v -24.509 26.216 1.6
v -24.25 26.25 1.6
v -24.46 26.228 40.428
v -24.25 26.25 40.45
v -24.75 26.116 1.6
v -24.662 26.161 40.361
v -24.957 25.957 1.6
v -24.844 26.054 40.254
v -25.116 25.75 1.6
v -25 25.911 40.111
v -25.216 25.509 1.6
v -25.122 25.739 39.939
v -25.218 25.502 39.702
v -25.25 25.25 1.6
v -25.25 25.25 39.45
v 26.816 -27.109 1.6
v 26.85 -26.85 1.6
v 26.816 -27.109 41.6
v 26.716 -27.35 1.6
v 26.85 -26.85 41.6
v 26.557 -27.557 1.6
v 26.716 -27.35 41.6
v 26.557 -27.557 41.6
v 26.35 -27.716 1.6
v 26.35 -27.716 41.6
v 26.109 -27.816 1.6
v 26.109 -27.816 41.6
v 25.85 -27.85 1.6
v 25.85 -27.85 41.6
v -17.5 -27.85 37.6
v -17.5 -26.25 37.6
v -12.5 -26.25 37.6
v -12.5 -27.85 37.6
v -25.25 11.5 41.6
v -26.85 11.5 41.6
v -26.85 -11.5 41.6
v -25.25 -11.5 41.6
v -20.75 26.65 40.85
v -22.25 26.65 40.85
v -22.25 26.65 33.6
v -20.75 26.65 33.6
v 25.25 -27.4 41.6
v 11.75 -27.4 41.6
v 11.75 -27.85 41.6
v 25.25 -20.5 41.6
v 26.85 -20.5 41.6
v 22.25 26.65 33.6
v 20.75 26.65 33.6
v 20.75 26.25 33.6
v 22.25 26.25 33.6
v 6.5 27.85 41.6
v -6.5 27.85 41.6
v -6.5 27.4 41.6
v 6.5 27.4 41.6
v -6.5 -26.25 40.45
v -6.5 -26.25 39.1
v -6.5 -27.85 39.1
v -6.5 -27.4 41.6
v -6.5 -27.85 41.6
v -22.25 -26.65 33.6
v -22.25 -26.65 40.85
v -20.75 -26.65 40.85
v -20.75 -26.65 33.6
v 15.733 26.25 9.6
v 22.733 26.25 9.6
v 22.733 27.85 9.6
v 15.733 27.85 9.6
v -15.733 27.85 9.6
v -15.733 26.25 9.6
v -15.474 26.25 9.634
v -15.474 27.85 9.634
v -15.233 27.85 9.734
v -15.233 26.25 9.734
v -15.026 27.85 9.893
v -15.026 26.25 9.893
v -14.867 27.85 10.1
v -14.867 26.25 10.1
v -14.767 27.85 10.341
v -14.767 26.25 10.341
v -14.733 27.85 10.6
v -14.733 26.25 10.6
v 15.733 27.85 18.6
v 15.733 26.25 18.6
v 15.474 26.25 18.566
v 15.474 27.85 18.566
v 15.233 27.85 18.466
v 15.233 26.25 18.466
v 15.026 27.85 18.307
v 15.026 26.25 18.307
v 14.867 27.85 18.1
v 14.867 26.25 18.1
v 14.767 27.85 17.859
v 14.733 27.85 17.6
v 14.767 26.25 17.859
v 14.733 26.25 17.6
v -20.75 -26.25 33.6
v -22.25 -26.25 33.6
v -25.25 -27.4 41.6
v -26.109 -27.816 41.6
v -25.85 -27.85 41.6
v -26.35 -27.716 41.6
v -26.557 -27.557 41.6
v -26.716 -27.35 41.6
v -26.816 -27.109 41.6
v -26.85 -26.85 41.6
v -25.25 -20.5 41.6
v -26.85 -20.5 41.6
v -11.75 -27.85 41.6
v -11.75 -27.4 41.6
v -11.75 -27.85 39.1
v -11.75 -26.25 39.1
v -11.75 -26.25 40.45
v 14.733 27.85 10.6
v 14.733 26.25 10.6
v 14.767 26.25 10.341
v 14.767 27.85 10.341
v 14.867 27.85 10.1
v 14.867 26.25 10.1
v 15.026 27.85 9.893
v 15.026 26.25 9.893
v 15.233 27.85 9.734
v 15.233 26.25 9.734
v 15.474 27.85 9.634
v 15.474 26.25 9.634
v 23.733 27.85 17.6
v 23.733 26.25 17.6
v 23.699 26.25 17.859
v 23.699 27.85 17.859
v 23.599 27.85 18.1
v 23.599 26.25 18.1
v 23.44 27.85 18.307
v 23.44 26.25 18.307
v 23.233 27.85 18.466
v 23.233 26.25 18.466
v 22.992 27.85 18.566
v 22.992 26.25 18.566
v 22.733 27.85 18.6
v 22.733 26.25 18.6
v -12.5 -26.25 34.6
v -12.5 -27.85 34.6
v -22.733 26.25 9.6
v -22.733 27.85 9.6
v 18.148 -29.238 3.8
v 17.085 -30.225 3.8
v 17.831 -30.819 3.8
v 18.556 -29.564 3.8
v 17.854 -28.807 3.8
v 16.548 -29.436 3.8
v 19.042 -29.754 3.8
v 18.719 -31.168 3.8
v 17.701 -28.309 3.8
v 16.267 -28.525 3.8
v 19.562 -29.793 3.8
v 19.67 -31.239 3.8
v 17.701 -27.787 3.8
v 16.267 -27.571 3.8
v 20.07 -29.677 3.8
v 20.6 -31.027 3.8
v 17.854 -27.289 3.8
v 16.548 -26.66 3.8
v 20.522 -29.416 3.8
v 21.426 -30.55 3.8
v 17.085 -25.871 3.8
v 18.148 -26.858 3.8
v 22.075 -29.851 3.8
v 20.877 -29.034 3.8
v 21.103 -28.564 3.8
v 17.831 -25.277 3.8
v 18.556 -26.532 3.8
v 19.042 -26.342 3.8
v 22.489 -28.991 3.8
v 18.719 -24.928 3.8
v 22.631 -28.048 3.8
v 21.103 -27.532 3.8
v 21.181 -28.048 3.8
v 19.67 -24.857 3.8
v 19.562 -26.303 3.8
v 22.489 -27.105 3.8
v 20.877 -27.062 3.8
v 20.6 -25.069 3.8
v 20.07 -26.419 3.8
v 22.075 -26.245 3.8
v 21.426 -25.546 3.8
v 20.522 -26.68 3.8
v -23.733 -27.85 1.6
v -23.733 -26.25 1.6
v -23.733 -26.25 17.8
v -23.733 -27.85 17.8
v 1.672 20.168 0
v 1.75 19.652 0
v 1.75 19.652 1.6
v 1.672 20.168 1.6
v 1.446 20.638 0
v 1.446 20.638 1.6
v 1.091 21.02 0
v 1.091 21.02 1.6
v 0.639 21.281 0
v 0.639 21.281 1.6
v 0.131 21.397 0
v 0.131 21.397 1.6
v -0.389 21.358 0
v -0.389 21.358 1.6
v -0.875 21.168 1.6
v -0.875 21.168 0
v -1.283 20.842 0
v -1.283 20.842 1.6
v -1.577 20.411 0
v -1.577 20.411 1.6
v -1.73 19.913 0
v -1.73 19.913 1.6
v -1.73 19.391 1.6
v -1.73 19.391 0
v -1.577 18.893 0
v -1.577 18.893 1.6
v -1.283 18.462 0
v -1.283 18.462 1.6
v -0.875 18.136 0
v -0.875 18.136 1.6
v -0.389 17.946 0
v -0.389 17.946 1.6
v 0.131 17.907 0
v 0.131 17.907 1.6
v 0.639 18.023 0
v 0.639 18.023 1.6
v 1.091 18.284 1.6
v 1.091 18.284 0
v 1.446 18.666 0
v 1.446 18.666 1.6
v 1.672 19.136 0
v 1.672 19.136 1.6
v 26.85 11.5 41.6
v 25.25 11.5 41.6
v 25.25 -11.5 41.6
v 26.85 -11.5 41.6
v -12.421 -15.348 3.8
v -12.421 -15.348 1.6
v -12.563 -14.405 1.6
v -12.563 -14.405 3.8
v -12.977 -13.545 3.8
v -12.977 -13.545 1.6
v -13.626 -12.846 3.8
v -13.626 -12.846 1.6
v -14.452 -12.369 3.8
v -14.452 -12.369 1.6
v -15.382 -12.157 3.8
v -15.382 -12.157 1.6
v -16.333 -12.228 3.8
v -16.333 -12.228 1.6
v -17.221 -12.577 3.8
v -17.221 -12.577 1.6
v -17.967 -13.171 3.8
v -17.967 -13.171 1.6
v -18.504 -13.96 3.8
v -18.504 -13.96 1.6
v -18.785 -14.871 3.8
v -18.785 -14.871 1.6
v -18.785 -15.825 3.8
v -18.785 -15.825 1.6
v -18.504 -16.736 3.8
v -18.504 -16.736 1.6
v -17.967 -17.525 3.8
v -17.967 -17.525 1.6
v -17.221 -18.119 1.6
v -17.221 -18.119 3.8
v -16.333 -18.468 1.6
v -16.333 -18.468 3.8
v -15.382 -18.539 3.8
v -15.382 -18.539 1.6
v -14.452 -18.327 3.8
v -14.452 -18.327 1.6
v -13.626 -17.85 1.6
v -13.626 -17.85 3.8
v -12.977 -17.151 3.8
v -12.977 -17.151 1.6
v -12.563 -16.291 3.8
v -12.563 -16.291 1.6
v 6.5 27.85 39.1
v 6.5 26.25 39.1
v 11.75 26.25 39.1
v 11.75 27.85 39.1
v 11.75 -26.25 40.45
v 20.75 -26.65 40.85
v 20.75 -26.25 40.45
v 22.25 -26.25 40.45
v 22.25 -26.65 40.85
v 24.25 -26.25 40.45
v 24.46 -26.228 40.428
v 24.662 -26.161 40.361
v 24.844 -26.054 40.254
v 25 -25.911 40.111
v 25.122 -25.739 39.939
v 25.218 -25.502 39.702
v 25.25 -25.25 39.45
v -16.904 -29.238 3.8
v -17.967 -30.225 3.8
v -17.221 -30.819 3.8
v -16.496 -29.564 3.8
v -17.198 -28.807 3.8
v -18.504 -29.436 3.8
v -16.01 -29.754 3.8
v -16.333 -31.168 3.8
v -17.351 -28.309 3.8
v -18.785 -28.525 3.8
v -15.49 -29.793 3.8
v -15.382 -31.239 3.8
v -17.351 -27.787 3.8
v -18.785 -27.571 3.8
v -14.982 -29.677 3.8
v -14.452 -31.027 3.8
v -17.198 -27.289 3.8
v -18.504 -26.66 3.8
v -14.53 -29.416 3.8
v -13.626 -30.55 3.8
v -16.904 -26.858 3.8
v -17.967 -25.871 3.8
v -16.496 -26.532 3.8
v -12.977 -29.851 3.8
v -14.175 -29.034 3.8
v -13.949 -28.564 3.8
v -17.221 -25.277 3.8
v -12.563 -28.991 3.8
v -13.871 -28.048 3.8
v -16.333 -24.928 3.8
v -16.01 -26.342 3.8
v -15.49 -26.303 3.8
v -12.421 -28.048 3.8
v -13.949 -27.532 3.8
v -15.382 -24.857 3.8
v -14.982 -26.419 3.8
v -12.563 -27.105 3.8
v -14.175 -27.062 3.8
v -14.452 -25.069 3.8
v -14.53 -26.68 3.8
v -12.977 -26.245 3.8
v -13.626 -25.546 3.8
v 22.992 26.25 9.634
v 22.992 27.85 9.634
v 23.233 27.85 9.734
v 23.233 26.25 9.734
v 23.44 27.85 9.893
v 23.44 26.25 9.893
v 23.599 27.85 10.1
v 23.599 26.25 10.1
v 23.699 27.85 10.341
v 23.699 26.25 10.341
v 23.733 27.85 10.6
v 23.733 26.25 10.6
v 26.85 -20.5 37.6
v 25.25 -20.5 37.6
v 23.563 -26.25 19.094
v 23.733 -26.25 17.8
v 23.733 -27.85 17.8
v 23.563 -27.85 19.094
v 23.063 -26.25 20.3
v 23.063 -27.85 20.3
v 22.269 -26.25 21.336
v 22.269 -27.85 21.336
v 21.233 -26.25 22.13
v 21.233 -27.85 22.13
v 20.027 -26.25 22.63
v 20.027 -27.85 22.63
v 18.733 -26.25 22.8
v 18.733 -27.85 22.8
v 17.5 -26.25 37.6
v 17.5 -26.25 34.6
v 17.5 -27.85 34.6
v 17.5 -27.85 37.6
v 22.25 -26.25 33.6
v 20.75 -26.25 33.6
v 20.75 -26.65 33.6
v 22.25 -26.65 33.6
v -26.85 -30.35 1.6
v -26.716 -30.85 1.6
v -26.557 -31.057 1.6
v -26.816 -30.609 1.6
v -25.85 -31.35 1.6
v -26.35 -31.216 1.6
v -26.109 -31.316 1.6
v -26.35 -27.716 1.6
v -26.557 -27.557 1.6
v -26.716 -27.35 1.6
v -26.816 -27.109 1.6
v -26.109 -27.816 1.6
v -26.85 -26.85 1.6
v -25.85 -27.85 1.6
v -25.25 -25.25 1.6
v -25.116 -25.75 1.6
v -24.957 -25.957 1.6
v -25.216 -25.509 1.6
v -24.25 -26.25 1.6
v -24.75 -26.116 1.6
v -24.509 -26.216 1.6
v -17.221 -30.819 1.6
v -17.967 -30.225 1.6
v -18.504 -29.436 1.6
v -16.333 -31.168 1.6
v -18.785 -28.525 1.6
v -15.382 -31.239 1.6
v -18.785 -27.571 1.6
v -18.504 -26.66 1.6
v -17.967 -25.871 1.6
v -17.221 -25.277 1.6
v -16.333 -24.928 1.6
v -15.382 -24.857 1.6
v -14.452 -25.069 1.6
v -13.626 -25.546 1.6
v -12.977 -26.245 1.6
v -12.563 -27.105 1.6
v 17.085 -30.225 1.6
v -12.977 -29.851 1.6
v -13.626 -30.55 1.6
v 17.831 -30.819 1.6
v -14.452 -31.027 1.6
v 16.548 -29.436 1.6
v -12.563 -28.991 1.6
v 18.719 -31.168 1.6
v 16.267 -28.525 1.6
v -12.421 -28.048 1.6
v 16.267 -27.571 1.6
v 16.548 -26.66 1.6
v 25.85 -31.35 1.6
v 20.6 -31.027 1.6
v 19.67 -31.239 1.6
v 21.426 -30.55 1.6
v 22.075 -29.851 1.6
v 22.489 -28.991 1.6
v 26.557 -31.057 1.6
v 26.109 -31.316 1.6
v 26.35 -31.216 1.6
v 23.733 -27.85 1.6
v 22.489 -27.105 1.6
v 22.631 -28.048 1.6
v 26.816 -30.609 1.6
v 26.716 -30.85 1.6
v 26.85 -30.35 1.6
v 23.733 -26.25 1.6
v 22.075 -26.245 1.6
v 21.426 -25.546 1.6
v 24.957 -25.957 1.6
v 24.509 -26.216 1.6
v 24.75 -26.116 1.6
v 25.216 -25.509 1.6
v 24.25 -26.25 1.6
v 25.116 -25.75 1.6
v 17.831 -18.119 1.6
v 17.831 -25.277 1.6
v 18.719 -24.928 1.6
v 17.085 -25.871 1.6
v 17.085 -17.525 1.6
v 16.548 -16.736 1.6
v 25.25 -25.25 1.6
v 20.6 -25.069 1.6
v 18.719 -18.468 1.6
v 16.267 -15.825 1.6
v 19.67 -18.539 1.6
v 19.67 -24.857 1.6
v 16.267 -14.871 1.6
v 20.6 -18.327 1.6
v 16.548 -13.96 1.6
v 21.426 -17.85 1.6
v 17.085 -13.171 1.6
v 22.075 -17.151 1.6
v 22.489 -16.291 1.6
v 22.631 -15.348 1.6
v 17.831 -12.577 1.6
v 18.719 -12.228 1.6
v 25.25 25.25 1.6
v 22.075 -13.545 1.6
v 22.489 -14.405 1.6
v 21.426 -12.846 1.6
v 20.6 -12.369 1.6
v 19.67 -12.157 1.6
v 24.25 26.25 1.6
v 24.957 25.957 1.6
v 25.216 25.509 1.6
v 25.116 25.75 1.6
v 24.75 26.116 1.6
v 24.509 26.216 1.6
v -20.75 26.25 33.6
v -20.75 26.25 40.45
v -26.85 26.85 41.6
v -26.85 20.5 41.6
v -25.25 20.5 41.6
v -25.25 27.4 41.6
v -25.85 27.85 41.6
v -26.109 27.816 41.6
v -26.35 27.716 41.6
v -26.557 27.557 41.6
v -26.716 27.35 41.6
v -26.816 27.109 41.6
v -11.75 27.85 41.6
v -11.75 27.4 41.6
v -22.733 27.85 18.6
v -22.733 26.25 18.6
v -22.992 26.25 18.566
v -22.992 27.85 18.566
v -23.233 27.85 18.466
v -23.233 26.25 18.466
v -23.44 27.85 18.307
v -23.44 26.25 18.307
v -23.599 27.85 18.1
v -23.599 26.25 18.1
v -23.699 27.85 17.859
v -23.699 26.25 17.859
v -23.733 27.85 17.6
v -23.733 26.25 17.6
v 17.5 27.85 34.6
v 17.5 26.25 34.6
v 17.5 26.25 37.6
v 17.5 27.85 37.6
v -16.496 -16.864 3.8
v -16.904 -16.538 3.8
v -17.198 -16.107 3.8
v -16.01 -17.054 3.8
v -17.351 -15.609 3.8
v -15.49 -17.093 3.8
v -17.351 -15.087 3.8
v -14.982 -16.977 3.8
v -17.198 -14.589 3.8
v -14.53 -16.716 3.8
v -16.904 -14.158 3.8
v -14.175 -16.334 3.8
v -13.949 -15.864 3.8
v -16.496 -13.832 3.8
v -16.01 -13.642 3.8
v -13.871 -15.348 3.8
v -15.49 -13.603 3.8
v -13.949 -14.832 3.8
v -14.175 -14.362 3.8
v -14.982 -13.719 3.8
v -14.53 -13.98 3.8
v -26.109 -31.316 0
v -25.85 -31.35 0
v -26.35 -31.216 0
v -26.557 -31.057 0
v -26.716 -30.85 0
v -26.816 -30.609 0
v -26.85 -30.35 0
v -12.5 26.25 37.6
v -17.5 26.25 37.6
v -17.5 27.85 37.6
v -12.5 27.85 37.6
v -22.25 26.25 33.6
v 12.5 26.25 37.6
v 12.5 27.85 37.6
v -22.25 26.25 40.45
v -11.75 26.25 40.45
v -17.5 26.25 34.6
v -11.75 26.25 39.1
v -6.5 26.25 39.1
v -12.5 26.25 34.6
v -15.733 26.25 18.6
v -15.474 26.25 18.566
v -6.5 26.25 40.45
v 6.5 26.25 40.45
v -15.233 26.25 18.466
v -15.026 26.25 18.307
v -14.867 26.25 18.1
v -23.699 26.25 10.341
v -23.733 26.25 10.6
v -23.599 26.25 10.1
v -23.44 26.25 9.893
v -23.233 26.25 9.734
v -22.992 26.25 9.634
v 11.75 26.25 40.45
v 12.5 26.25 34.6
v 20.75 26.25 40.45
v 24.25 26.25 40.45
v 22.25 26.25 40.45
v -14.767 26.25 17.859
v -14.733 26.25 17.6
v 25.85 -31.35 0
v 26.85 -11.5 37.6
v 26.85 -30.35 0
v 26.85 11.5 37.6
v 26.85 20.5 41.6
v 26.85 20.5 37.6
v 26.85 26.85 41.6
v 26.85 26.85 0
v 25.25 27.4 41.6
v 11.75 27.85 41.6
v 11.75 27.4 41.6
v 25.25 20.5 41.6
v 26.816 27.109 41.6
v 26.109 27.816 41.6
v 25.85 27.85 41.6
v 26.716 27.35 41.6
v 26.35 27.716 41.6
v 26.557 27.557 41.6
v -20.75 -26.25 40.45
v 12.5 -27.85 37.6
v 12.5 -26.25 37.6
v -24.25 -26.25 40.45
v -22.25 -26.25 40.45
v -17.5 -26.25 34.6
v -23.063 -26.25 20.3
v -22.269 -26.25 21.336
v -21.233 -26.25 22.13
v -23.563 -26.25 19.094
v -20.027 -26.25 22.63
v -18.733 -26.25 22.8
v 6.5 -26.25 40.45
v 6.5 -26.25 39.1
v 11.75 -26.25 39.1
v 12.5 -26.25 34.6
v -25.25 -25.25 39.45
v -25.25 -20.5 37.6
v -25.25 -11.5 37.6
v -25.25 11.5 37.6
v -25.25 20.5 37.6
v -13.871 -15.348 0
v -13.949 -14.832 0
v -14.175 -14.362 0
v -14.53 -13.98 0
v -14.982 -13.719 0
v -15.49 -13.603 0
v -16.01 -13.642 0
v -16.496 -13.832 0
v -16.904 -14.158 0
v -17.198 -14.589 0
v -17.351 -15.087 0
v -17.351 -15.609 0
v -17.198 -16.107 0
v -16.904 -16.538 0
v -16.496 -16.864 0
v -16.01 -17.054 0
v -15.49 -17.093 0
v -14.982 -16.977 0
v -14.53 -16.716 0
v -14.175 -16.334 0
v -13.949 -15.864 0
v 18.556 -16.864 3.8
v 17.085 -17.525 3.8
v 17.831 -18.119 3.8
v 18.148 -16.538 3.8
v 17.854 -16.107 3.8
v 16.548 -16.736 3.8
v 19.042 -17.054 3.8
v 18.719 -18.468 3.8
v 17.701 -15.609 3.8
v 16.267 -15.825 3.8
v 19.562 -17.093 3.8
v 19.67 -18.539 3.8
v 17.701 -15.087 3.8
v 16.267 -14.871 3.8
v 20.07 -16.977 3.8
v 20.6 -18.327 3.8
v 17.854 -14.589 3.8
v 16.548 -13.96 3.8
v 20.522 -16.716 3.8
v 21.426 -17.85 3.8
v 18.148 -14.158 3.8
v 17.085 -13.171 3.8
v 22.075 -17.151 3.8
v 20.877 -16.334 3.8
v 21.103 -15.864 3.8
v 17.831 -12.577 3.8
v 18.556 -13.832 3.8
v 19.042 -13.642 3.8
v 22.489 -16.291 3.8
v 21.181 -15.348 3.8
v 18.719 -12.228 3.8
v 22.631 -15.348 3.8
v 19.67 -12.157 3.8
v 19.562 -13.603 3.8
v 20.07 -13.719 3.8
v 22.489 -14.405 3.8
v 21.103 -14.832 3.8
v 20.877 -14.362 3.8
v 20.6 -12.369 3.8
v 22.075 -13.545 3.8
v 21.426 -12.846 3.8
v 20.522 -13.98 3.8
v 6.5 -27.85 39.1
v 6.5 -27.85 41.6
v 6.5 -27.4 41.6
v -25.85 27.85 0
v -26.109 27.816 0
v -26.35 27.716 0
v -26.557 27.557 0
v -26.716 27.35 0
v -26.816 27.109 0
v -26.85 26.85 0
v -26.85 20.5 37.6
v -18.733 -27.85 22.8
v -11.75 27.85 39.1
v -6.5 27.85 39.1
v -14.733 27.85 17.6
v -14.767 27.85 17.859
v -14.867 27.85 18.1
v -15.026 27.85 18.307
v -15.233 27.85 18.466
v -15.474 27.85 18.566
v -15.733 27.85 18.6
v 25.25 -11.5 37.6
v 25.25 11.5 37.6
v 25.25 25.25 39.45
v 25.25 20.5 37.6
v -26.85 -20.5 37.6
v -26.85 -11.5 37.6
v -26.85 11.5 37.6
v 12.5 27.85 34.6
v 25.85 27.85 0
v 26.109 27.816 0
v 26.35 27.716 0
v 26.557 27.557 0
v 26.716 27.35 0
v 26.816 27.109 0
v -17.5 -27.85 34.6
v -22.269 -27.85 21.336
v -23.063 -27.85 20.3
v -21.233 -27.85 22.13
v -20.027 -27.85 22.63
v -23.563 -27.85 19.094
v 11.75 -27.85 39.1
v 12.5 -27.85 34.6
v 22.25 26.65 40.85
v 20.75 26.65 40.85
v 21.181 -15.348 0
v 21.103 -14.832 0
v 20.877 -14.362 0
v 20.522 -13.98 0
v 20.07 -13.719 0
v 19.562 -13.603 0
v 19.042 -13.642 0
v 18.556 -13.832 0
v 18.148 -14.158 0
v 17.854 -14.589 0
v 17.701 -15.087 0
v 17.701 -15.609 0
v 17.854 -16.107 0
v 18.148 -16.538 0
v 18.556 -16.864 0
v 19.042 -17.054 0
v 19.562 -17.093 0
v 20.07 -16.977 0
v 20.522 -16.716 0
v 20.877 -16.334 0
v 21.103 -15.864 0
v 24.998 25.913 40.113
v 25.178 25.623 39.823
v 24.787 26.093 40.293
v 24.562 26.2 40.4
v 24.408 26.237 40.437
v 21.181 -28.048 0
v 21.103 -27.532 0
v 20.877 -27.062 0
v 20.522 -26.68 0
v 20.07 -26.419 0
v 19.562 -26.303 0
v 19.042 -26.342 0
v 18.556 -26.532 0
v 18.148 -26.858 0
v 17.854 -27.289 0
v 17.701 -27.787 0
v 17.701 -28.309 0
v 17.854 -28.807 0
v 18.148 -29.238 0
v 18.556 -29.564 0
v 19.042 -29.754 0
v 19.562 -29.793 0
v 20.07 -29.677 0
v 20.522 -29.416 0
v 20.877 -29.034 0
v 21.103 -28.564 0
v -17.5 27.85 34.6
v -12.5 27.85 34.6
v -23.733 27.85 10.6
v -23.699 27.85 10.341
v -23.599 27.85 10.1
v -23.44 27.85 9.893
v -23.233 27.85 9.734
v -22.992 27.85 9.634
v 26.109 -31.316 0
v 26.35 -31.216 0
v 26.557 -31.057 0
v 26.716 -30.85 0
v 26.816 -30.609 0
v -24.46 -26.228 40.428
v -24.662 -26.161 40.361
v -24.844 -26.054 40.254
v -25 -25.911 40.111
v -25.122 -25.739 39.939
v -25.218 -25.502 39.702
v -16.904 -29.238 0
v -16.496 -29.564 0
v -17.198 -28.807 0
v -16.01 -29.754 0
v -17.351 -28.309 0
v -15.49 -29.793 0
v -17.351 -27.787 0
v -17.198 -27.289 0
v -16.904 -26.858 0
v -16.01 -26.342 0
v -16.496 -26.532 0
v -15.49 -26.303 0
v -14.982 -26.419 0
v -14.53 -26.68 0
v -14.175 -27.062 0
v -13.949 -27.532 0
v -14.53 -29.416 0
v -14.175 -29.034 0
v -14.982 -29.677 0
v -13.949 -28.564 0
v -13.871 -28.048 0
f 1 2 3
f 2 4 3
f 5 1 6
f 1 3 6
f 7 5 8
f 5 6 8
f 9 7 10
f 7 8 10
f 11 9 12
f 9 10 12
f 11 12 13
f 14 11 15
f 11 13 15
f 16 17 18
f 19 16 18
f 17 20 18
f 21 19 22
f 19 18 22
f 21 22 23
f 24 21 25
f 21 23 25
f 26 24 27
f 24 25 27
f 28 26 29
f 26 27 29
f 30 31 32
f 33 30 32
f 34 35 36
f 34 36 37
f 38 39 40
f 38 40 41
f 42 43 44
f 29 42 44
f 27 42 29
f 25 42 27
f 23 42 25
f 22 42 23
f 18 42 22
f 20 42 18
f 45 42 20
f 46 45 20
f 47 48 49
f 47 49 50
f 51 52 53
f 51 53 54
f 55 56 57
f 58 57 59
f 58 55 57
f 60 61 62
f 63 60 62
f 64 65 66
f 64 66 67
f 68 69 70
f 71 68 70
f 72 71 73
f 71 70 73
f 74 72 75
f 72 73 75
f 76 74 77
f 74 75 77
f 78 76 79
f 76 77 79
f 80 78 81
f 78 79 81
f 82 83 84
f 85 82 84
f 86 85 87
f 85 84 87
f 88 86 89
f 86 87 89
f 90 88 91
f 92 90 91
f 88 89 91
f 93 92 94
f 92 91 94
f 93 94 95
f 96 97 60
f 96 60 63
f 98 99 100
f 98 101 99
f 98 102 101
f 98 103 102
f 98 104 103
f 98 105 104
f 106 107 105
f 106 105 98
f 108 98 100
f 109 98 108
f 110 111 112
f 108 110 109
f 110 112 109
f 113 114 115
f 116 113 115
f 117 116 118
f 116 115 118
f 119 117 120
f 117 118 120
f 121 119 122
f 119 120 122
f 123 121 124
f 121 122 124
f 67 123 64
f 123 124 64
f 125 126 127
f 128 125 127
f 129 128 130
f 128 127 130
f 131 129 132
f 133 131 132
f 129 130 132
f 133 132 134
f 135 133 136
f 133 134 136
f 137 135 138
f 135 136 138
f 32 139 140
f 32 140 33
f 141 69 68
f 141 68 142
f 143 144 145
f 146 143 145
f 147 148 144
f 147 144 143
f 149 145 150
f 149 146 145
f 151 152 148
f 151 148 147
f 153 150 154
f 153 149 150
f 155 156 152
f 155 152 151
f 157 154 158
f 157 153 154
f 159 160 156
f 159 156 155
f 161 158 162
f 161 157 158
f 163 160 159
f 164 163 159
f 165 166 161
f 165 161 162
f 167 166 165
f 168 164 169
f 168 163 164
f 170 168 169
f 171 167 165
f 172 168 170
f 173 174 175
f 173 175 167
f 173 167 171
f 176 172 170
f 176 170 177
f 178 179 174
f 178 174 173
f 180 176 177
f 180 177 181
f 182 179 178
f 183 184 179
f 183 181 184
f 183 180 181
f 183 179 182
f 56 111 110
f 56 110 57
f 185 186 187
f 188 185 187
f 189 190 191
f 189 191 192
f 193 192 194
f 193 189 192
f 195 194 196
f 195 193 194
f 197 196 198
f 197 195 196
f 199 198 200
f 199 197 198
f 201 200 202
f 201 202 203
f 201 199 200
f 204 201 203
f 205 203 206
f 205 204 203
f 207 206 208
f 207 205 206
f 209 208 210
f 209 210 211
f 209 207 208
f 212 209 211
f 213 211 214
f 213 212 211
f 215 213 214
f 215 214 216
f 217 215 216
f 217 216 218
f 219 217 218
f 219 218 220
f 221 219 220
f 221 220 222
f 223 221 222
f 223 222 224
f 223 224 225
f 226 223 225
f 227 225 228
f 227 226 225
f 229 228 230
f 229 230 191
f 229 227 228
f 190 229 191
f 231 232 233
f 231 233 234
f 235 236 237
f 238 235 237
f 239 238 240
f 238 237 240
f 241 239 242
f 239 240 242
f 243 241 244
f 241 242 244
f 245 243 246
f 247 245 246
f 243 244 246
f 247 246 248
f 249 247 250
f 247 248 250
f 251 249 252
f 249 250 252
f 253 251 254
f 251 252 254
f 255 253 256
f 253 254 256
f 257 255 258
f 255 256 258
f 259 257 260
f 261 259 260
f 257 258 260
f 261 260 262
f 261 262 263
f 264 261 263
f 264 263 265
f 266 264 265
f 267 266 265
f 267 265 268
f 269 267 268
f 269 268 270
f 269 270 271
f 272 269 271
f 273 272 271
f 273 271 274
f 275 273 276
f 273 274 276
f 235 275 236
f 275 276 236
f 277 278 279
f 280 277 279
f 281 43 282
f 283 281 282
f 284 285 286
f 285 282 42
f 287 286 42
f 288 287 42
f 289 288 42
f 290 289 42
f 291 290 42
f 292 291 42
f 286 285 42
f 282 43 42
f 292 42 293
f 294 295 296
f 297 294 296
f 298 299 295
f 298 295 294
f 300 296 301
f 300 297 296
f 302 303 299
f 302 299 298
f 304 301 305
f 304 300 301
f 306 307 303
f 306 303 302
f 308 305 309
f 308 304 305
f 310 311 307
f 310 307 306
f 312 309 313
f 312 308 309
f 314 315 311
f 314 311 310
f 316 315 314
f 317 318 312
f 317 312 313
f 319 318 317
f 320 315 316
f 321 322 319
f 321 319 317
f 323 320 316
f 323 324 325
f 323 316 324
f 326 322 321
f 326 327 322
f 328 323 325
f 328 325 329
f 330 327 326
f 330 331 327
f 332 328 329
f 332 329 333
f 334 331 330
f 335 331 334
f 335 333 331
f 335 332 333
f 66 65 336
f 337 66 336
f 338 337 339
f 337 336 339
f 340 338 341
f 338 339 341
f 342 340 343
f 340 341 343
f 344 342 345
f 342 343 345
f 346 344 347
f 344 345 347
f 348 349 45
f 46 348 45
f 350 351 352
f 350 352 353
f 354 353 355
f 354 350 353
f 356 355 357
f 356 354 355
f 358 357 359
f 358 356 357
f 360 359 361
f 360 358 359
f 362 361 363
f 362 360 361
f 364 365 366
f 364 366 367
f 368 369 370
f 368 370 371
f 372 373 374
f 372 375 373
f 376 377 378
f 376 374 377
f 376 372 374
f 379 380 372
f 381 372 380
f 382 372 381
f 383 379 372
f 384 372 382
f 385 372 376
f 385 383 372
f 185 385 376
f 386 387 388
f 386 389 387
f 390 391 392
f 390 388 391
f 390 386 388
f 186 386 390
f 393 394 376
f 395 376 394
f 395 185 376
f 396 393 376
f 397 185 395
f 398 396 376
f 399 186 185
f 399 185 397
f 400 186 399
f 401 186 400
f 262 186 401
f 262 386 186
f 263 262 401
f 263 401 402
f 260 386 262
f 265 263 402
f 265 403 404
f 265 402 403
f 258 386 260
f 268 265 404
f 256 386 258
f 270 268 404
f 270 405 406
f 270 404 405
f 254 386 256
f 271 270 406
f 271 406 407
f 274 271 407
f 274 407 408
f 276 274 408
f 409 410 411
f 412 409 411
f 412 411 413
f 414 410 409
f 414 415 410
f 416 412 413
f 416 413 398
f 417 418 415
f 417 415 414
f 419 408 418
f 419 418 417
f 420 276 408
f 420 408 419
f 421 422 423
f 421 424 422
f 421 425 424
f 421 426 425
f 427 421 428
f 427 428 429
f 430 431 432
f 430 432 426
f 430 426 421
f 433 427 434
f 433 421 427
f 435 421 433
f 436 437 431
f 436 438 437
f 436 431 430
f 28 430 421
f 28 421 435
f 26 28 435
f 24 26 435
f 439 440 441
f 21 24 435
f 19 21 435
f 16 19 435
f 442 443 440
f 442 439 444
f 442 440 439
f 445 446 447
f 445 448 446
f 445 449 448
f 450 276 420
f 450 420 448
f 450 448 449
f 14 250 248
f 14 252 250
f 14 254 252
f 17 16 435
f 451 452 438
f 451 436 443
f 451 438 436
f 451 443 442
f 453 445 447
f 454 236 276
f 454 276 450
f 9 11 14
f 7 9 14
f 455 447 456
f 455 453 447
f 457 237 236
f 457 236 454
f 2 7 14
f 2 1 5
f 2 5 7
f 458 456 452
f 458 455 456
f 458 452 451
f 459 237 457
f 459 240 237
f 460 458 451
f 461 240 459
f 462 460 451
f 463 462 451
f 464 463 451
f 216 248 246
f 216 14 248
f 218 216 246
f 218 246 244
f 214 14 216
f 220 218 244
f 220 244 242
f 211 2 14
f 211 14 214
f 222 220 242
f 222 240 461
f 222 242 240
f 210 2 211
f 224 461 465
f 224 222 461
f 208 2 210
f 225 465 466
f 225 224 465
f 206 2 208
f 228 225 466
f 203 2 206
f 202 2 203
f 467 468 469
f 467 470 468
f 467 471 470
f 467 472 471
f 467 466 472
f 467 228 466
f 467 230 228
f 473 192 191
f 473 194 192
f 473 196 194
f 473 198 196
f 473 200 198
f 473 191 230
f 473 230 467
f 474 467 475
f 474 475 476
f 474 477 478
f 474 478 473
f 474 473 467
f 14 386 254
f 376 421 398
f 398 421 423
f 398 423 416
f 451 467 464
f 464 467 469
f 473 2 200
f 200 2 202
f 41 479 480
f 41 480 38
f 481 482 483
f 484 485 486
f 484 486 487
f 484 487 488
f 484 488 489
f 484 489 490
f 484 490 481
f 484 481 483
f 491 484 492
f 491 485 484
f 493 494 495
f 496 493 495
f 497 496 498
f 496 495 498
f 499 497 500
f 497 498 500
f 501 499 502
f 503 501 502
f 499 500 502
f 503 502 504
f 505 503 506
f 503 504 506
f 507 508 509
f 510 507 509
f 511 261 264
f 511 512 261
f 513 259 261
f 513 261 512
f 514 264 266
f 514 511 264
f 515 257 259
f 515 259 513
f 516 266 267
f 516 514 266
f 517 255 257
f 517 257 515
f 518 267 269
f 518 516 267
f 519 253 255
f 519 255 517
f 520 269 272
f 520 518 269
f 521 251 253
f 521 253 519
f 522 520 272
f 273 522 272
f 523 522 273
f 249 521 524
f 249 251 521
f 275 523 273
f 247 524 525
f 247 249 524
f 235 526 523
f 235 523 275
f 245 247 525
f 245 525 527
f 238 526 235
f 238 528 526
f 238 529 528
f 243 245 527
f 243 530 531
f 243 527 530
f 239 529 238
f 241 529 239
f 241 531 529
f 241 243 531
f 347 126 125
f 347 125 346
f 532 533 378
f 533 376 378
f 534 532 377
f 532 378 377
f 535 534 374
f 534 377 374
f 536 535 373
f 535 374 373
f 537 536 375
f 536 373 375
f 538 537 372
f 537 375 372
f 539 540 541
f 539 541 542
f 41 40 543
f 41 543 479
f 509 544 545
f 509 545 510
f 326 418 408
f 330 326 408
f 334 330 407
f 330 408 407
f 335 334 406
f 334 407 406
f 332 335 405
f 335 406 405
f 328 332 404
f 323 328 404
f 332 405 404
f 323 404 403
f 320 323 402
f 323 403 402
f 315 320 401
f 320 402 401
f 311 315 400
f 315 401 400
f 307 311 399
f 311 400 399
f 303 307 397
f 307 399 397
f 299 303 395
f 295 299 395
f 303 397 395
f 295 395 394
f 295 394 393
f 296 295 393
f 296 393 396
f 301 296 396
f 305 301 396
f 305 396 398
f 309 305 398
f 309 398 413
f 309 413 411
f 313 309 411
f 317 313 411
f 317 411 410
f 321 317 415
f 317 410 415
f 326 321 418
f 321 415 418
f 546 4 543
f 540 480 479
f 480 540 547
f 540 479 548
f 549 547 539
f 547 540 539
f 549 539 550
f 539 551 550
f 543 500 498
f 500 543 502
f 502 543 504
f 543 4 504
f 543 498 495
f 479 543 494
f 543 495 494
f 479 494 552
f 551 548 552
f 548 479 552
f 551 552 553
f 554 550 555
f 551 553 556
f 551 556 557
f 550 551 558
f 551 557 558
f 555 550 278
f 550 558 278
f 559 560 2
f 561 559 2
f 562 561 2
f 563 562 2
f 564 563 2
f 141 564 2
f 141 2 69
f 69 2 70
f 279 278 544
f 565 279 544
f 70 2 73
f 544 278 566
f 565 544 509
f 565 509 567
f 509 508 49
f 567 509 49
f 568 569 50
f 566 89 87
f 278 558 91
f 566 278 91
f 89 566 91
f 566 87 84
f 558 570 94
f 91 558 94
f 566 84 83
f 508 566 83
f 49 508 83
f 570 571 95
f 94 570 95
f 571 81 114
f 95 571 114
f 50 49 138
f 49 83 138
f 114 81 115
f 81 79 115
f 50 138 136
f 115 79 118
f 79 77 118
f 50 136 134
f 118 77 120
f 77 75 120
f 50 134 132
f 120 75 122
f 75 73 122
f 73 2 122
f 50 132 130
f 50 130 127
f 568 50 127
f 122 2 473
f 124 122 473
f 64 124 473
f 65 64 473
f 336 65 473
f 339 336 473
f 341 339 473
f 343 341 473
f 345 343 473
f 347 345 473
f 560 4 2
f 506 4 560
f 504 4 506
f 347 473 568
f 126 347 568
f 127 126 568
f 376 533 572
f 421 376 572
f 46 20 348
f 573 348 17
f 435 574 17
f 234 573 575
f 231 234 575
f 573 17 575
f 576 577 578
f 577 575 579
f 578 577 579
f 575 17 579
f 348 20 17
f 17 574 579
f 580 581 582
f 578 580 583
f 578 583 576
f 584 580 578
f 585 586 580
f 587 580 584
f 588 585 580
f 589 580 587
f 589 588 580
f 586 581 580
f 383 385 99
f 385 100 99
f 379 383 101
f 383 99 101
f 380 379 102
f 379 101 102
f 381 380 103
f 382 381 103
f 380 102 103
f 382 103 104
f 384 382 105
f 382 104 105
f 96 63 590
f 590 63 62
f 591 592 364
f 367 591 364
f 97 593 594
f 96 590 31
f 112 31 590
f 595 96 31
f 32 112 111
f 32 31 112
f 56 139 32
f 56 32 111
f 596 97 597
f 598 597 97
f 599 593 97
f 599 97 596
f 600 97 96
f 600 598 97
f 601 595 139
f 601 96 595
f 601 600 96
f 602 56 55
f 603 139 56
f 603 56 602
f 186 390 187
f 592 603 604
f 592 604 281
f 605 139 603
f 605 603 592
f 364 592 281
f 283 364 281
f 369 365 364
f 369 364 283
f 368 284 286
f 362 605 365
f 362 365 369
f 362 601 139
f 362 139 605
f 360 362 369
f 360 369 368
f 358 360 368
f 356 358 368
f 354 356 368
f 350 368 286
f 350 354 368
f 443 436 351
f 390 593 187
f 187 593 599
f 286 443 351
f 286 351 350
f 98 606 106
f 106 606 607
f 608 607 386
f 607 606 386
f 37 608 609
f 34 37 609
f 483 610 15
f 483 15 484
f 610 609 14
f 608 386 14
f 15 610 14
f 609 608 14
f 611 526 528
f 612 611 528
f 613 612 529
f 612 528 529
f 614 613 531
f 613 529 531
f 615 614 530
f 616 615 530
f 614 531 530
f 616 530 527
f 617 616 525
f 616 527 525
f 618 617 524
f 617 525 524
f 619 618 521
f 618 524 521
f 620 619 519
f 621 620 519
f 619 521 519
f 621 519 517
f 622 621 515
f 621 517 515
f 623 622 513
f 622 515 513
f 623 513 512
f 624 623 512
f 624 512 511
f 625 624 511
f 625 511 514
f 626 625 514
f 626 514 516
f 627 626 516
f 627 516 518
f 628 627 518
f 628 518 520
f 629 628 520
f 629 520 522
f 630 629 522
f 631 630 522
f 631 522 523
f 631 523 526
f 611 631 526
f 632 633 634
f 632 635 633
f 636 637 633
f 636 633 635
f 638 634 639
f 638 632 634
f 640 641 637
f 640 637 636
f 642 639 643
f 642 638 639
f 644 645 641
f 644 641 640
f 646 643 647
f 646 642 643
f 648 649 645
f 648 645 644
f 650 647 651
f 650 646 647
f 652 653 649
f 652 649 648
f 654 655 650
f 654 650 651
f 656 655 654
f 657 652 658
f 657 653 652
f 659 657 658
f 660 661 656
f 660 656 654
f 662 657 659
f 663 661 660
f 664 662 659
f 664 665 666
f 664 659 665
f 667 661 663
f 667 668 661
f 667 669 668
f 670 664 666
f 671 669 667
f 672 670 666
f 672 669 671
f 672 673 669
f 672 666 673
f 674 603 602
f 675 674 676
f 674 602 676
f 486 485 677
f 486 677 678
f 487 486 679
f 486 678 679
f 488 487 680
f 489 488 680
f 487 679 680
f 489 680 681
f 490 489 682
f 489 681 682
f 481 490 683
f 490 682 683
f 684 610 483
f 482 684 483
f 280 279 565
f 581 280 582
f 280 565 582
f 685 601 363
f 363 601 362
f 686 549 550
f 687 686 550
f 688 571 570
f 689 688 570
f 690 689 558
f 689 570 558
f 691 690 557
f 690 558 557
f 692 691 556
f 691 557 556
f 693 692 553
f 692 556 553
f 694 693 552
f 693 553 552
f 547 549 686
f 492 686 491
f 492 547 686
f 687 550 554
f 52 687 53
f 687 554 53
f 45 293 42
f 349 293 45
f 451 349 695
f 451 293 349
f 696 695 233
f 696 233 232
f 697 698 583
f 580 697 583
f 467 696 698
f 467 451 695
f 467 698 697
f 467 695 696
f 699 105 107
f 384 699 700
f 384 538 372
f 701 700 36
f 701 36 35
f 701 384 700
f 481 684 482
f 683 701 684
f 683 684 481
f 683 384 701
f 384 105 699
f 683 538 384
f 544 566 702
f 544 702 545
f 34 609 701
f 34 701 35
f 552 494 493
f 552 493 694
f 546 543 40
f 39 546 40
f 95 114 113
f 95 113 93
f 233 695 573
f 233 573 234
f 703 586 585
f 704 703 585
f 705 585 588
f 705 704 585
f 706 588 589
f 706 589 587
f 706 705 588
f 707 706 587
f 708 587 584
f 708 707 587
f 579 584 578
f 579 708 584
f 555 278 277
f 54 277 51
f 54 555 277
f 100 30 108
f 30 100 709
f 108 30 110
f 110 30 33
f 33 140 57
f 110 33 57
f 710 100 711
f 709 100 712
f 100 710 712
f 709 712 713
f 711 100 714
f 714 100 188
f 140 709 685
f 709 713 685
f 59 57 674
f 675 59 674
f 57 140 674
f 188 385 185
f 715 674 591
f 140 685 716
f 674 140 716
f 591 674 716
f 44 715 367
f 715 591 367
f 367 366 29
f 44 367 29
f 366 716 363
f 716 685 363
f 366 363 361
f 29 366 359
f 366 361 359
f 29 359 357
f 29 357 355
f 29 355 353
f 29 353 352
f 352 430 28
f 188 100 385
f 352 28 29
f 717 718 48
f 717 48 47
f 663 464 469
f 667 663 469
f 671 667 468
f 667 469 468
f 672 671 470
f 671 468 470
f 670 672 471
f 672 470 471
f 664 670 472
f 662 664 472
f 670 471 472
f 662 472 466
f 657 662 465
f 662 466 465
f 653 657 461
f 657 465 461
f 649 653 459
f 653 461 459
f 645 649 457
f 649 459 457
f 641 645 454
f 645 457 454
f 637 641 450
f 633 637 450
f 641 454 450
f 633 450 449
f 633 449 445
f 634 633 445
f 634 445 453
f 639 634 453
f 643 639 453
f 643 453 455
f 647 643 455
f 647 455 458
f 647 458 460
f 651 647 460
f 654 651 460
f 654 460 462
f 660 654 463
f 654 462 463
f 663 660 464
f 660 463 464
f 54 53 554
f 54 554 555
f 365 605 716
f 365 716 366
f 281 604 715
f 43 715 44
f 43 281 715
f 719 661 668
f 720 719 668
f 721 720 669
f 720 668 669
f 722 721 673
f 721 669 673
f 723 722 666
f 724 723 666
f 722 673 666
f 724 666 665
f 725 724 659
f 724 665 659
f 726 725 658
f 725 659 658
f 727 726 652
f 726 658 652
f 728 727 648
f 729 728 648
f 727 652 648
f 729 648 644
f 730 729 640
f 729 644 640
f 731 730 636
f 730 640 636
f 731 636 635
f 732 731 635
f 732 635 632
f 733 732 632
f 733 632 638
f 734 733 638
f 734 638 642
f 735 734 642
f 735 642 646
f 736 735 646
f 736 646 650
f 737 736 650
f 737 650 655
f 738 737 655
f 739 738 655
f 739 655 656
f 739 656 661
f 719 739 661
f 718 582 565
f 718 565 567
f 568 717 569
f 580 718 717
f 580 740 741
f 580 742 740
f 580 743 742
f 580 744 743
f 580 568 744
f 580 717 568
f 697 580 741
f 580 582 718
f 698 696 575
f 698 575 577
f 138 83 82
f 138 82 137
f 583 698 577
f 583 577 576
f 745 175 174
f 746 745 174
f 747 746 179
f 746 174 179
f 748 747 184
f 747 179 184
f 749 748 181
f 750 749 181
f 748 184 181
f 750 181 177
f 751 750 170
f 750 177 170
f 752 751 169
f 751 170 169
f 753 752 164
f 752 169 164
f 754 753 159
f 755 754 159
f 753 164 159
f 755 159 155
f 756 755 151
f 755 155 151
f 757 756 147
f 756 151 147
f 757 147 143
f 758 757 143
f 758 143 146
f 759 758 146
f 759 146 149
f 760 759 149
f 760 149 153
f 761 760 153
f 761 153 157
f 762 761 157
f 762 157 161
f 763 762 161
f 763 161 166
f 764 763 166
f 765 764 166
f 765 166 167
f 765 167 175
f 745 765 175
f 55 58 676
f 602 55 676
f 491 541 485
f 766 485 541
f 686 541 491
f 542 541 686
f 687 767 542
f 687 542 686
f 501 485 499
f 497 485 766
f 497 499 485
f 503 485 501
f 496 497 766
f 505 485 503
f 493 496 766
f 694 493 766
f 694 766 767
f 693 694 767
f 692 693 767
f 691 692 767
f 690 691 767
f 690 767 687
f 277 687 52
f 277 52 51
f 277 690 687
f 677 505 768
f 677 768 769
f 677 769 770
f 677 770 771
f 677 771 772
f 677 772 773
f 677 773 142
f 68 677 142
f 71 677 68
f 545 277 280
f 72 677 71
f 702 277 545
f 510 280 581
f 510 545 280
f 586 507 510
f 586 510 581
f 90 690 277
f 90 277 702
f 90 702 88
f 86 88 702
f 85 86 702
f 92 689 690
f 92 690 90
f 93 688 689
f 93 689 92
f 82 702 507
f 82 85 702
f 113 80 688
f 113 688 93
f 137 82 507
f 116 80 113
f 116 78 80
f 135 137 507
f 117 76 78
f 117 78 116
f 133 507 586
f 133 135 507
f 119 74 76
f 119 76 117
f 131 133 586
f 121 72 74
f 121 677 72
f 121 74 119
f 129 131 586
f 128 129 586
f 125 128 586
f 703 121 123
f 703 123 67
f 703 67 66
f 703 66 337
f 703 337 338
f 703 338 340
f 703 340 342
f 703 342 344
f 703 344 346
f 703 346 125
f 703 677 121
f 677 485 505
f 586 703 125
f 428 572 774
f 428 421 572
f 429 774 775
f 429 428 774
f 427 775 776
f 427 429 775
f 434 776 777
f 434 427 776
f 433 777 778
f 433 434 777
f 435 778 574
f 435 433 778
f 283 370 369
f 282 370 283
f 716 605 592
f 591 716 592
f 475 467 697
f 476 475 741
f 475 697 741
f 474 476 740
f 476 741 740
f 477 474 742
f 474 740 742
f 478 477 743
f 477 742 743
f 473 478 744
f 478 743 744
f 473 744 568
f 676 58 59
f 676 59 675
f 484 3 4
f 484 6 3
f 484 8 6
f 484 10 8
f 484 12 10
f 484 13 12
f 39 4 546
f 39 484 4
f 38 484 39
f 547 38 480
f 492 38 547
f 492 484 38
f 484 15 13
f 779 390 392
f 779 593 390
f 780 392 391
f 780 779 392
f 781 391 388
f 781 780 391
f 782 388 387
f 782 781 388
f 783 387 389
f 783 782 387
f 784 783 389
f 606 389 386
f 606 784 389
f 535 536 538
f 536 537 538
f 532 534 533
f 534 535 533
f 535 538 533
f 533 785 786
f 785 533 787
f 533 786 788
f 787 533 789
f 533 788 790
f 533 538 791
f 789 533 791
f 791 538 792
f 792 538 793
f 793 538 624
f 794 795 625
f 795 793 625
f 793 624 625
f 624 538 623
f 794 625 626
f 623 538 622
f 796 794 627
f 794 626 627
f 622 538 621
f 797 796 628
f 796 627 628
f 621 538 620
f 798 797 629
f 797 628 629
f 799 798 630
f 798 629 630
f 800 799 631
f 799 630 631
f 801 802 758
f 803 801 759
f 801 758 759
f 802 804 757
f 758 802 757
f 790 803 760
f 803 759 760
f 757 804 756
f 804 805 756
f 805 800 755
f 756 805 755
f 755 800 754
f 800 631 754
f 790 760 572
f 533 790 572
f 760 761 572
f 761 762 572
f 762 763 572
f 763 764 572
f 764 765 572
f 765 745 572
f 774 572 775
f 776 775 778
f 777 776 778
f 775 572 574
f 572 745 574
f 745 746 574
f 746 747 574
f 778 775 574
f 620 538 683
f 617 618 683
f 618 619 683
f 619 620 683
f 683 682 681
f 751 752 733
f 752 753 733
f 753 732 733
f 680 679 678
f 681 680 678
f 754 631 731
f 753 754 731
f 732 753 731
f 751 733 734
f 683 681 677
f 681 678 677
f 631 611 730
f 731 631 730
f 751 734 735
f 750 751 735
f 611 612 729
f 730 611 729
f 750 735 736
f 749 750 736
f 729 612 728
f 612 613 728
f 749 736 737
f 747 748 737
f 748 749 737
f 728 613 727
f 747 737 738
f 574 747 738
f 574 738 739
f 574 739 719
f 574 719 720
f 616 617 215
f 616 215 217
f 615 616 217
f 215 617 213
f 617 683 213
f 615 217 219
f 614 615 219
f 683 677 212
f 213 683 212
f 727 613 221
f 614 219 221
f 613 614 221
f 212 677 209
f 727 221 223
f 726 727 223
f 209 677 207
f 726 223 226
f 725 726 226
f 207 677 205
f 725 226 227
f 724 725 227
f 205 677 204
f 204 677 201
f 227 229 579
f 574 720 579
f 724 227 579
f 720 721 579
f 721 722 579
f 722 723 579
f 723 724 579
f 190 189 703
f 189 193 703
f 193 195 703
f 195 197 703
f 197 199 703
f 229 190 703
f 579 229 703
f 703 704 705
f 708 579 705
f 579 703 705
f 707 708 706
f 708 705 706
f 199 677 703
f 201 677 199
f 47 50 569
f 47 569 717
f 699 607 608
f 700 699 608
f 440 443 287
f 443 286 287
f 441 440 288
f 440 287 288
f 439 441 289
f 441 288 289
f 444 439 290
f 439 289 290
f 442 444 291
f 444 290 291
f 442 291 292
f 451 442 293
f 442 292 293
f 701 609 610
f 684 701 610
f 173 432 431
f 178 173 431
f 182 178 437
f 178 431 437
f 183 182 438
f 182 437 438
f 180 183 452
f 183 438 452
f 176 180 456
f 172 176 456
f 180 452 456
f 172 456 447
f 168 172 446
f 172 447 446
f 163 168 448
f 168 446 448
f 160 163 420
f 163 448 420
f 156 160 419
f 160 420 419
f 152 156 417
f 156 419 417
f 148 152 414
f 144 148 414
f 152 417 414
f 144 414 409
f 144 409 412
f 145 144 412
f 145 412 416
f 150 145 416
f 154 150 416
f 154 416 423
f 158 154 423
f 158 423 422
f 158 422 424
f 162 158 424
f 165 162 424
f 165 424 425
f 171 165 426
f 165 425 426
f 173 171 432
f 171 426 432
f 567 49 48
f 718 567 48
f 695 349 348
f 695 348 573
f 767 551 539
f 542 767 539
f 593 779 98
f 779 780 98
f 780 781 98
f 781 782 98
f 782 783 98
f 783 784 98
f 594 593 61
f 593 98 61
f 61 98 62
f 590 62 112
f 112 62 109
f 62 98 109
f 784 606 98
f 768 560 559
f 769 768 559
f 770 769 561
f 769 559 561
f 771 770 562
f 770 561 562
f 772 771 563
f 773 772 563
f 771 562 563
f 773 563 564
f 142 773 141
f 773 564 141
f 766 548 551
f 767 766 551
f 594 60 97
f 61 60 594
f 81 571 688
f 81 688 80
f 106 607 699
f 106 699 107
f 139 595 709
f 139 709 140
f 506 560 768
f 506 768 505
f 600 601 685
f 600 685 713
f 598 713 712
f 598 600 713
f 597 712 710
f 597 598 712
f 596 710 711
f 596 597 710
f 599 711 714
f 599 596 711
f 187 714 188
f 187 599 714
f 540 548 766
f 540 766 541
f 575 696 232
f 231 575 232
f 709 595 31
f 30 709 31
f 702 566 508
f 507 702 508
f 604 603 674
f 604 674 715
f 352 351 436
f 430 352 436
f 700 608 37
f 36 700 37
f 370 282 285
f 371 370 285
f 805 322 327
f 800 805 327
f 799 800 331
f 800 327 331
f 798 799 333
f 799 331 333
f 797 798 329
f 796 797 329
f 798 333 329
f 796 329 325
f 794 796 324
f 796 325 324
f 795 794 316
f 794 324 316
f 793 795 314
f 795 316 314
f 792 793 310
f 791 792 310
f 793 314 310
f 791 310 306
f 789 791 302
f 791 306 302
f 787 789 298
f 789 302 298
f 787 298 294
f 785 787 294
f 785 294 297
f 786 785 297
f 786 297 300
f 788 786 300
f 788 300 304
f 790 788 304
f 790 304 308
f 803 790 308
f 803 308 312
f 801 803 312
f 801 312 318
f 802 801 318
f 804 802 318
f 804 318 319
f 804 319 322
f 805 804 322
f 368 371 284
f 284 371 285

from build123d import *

# Parameters (mm, degrees)
SKETCH054_W          = 53.7
SKETCH054_H          = 59.2
SKETCH054_R          = 1.75
PAD015_DEPTH         = 1.6
SKETCH055_W          = 53.7
SKETCH055_H          = 55.7
SKETCH055_W_2        = 50.5
SKETCH055_H_2        = 52.5
PAD016_DEPTH         = 40
CHAMFER002_SIZE      = 1.15
FILLET006_R          = 1
SKETCH056_W          = 5
SKETCH056_H          = 3
SKETCH056_W_2        = 5.25
SKETCH056_H_2        = 2.5
POCKET016_DEPTH      = 27.851
POCKET016_DEPTH_BACK = 31.351
POCKET017_DEPTH      = 31.351
POCKET022_DEPTH      = 27.851
SKETCH058_W          = 9
SKETCH058_H          = 4
POCKET018_DEPTH      = 26.851
POCKET018_DEPTH_BACK = 26.851
SKETCH059_R          = 3.2
PAD017_DEPTH         = 2.2
SKETCH060_R          = 1.75
POCKET019_DEPTH      = 3.801
SKETCH061_W          = 1.5
SKETCH061_H          = 0.4
POCKET020_DEPTH      = 8


with BuildPart() as part:
    # Sketch054 → Pad015 (new body)
    with BuildSketch(Plane.XY):
        with Locations((0, -1.75)):
            Rectangle(SKETCH054_W, SKETCH054_H)
        with Locations((0, 19.652)):
            Circle(SKETCH054_R, mode=Mode.SUBTRACT)
    extrude(amount=PAD015_DEPTH)

    # Sketch055 → Pad016 (join)
    with BuildSketch(Plane.XY.offset(1.6)):
        Rectangle(SKETCH055_W, SKETCH055_H)
        Rectangle(SKETCH055_W_2, SKETCH055_H_2, mode=Mode.SUBTRACT)
    extrude(amount=PAD016_DEPTH)

    # Chamfer002
    chamfer002_edges = [part.edges().sort_by_distance(p)[0] for p in [
        (0, 26.25, 41.6),
        (0, -26.25, 41.6),
    ]]
    chamfer(chamfer002_edges, length=CHAMFER002_SIZE)

    # Fillet006
    fillet006_edges = [part.edges().sort_by_distance(p)[0] for p in [
        (-25.25, -26.25, 21.025),
        (-26.85, -27.85, 21.6),
        (-25.25, 26.25, 21.025),
        (-26.85, 27.85, 21.6),
        (25.25, 26.25, 21.025),
        (26.85, 27.85, 21.6),
        (25.25, -26.25, 21.025),
        (26.85, -27.85, 21.6),
        (-26.85, -31.35, 0.8),
        (26.85, -31.35, 0.8),
    ]]
    fillet(fillet006_edges, radius=FILLET006_R)

    # Sketch056 → Pocket016 (cut, two sides)
    with BuildSketch(Plane.XZ) as pocket016_sk:
        with Locations((-15, 36.1)):
            Rectangle(SKETCH056_W, SKETCH056_H)
        with Locations((15, 36.1)):
            Rectangle(SKETCH056_W, SKETCH056_H)
        with Locations((-9.125, 40.35)):
            Rectangle(SKETCH056_W_2, SKETCH056_H_2)
        with Locations((9.125, 40.35)):
            Rectangle(SKETCH056_W_2, SKETCH056_H_2)
    extrude(amount=-POCKET016_DEPTH, mode=Mode.SUBTRACT)
    extrude(pocket016_sk.sketch, amount=POCKET016_DEPTH_BACK, mode=Mode.SUBTRACT)

    # Sketch057 → Pocket017 (cut, through all)
    with BuildSketch(Plane.XZ):
        with BuildLine():
            Line((23.733, 17.8), (23.733, 1.6))
            Line((23.733, 1.6), (-23.733, 1.6))
            Line((-23.733, 1.6), (-23.733, 17.8))
            ThreePointArc((-18.733, 22.8), (-22.268534, 21.335534), (-23.733, 17.8))
            Line((-18.733, 22.8), (18.733, 22.8))
            ThreePointArc((23.733, 17.8), (22.268534, 21.335534), (18.733, 22.8))
        make_face()
    extrude(amount=POCKET017_DEPTH, mode=Mode.SUBTRACT)

    # Sketch063 → Pocket022 (cut, through all)
    with BuildSketch(Plane.XZ):
        with BuildLine():
            Line((-22.733, 18.6), (-15.733, 18.6))
            ThreePointArc((-14.733, 17.599995), (-15.025892, 18.307105), (-15.733, 18.6))
            Line((-14.733, 17.599995), (-14.733034, 10.599995))
            ThreePointArc((-15.733034, 9.6), (-15.025929, 9.892892), (-14.733034, 10.599995))
            Line((-15.733034, 9.6), (-22.733, 9.6))
            ThreePointArc((-23.733, 10.6), (-23.440107, 9.892893), (-22.733, 9.6))
            Line((-23.733, 10.6), (-23.733, 17.6))
            ThreePointArc((-22.733, 18.6), (-23.440107, 18.307107), (-23.733, 17.6))
        make_face()
        with BuildLine():
            Line((15.733, 18.599966), (22.733, 18.599966))
            ThreePointArc((23.733, 17.599966), (23.440107, 18.307073), (22.733, 18.599966))
            Line((23.733, 17.599966), (23.733, 10.6))
            ThreePointArc((22.733, 9.6), (23.440107, 9.892893), (23.733, 10.6))
            Line((22.733, 9.6), (15.733, 9.6))
            ThreePointArc((14.733, 10.6), (15.025893, 9.892893), (15.733, 9.6))
            Line((14.733, 10.6), (14.733, 17.599966))
            ThreePointArc((15.733, 18.599966), (15.025893, 18.307073), (14.733, 17.599966))
        make_face()
    extrude(amount=-POCKET022_DEPTH, mode=Mode.SUBTRACT)

    # Sketch058 → Pocket018 (cut, two sides)
    with BuildSketch(Plane.YZ) as pocket018_sk:
        with Locations((-16, 39.6)):
            Rectangle(SKETCH058_W, SKETCH058_H)
        with Locations((16, 39.6)):
            Rectangle(SKETCH058_W, SKETCH058_H)
    extrude(amount=-POCKET018_DEPTH, mode=Mode.SUBTRACT)
    extrude(pocket018_sk.sketch, amount=POCKET018_DEPTH_BACK, mode=Mode.SUBTRACT)

    # Sketch059 → Pad017 (join)
    with BuildSketch(Plane.XY.offset(1.6)):
        with Locations((-15.621, -15.348)):
            Circle(SKETCH059_R)
        with Locations((19.431, -15.348)):
            Circle(SKETCH059_R)
        with Locations((19.431, -28.048)):
            Circle(SKETCH059_R)
        with Locations((-15.621, -28.048)):
            Circle(SKETCH059_R)
    extrude(amount=PAD017_DEPTH)

    # Sketch060 → Pocket019 (cut, through all)
    with BuildSketch(Plane.XY.offset(3.8)):
        with Locations((-15.621, -15.348)):
            Circle(SKETCH060_R)
        with Locations((19.431, -15.348)):
            Circle(SKETCH060_R)
        with Locations((19.431, -28.048)):
            Circle(SKETCH060_R)
        with Locations((-15.621, -28.048)):
            Circle(SKETCH060_R)
    extrude(amount=-POCKET019_DEPTH, mode=Mode.SUBTRACT)

    # Sketch061 → Pocket020 (cut)
    with BuildSketch(Plane.XY.offset(41.6)):
        with Locations((-21.5, 26.45)):
            Rectangle(SKETCH061_W, SKETCH061_H)
        with Locations((21.5, 26.45)):
            Rectangle(SKETCH061_W, SKETCH061_H)
        with Locations((21.5, -26.45)):
            Rectangle(SKETCH061_W, SKETCH061_H)
        with Locations((-21.5, -26.45)):
            Rectangle(SKETCH061_W, SKETCH061_H)
    extrude(amount=-POCKET020_DEPTH, mode=Mode.SUBTRACT)


solid = part.part
